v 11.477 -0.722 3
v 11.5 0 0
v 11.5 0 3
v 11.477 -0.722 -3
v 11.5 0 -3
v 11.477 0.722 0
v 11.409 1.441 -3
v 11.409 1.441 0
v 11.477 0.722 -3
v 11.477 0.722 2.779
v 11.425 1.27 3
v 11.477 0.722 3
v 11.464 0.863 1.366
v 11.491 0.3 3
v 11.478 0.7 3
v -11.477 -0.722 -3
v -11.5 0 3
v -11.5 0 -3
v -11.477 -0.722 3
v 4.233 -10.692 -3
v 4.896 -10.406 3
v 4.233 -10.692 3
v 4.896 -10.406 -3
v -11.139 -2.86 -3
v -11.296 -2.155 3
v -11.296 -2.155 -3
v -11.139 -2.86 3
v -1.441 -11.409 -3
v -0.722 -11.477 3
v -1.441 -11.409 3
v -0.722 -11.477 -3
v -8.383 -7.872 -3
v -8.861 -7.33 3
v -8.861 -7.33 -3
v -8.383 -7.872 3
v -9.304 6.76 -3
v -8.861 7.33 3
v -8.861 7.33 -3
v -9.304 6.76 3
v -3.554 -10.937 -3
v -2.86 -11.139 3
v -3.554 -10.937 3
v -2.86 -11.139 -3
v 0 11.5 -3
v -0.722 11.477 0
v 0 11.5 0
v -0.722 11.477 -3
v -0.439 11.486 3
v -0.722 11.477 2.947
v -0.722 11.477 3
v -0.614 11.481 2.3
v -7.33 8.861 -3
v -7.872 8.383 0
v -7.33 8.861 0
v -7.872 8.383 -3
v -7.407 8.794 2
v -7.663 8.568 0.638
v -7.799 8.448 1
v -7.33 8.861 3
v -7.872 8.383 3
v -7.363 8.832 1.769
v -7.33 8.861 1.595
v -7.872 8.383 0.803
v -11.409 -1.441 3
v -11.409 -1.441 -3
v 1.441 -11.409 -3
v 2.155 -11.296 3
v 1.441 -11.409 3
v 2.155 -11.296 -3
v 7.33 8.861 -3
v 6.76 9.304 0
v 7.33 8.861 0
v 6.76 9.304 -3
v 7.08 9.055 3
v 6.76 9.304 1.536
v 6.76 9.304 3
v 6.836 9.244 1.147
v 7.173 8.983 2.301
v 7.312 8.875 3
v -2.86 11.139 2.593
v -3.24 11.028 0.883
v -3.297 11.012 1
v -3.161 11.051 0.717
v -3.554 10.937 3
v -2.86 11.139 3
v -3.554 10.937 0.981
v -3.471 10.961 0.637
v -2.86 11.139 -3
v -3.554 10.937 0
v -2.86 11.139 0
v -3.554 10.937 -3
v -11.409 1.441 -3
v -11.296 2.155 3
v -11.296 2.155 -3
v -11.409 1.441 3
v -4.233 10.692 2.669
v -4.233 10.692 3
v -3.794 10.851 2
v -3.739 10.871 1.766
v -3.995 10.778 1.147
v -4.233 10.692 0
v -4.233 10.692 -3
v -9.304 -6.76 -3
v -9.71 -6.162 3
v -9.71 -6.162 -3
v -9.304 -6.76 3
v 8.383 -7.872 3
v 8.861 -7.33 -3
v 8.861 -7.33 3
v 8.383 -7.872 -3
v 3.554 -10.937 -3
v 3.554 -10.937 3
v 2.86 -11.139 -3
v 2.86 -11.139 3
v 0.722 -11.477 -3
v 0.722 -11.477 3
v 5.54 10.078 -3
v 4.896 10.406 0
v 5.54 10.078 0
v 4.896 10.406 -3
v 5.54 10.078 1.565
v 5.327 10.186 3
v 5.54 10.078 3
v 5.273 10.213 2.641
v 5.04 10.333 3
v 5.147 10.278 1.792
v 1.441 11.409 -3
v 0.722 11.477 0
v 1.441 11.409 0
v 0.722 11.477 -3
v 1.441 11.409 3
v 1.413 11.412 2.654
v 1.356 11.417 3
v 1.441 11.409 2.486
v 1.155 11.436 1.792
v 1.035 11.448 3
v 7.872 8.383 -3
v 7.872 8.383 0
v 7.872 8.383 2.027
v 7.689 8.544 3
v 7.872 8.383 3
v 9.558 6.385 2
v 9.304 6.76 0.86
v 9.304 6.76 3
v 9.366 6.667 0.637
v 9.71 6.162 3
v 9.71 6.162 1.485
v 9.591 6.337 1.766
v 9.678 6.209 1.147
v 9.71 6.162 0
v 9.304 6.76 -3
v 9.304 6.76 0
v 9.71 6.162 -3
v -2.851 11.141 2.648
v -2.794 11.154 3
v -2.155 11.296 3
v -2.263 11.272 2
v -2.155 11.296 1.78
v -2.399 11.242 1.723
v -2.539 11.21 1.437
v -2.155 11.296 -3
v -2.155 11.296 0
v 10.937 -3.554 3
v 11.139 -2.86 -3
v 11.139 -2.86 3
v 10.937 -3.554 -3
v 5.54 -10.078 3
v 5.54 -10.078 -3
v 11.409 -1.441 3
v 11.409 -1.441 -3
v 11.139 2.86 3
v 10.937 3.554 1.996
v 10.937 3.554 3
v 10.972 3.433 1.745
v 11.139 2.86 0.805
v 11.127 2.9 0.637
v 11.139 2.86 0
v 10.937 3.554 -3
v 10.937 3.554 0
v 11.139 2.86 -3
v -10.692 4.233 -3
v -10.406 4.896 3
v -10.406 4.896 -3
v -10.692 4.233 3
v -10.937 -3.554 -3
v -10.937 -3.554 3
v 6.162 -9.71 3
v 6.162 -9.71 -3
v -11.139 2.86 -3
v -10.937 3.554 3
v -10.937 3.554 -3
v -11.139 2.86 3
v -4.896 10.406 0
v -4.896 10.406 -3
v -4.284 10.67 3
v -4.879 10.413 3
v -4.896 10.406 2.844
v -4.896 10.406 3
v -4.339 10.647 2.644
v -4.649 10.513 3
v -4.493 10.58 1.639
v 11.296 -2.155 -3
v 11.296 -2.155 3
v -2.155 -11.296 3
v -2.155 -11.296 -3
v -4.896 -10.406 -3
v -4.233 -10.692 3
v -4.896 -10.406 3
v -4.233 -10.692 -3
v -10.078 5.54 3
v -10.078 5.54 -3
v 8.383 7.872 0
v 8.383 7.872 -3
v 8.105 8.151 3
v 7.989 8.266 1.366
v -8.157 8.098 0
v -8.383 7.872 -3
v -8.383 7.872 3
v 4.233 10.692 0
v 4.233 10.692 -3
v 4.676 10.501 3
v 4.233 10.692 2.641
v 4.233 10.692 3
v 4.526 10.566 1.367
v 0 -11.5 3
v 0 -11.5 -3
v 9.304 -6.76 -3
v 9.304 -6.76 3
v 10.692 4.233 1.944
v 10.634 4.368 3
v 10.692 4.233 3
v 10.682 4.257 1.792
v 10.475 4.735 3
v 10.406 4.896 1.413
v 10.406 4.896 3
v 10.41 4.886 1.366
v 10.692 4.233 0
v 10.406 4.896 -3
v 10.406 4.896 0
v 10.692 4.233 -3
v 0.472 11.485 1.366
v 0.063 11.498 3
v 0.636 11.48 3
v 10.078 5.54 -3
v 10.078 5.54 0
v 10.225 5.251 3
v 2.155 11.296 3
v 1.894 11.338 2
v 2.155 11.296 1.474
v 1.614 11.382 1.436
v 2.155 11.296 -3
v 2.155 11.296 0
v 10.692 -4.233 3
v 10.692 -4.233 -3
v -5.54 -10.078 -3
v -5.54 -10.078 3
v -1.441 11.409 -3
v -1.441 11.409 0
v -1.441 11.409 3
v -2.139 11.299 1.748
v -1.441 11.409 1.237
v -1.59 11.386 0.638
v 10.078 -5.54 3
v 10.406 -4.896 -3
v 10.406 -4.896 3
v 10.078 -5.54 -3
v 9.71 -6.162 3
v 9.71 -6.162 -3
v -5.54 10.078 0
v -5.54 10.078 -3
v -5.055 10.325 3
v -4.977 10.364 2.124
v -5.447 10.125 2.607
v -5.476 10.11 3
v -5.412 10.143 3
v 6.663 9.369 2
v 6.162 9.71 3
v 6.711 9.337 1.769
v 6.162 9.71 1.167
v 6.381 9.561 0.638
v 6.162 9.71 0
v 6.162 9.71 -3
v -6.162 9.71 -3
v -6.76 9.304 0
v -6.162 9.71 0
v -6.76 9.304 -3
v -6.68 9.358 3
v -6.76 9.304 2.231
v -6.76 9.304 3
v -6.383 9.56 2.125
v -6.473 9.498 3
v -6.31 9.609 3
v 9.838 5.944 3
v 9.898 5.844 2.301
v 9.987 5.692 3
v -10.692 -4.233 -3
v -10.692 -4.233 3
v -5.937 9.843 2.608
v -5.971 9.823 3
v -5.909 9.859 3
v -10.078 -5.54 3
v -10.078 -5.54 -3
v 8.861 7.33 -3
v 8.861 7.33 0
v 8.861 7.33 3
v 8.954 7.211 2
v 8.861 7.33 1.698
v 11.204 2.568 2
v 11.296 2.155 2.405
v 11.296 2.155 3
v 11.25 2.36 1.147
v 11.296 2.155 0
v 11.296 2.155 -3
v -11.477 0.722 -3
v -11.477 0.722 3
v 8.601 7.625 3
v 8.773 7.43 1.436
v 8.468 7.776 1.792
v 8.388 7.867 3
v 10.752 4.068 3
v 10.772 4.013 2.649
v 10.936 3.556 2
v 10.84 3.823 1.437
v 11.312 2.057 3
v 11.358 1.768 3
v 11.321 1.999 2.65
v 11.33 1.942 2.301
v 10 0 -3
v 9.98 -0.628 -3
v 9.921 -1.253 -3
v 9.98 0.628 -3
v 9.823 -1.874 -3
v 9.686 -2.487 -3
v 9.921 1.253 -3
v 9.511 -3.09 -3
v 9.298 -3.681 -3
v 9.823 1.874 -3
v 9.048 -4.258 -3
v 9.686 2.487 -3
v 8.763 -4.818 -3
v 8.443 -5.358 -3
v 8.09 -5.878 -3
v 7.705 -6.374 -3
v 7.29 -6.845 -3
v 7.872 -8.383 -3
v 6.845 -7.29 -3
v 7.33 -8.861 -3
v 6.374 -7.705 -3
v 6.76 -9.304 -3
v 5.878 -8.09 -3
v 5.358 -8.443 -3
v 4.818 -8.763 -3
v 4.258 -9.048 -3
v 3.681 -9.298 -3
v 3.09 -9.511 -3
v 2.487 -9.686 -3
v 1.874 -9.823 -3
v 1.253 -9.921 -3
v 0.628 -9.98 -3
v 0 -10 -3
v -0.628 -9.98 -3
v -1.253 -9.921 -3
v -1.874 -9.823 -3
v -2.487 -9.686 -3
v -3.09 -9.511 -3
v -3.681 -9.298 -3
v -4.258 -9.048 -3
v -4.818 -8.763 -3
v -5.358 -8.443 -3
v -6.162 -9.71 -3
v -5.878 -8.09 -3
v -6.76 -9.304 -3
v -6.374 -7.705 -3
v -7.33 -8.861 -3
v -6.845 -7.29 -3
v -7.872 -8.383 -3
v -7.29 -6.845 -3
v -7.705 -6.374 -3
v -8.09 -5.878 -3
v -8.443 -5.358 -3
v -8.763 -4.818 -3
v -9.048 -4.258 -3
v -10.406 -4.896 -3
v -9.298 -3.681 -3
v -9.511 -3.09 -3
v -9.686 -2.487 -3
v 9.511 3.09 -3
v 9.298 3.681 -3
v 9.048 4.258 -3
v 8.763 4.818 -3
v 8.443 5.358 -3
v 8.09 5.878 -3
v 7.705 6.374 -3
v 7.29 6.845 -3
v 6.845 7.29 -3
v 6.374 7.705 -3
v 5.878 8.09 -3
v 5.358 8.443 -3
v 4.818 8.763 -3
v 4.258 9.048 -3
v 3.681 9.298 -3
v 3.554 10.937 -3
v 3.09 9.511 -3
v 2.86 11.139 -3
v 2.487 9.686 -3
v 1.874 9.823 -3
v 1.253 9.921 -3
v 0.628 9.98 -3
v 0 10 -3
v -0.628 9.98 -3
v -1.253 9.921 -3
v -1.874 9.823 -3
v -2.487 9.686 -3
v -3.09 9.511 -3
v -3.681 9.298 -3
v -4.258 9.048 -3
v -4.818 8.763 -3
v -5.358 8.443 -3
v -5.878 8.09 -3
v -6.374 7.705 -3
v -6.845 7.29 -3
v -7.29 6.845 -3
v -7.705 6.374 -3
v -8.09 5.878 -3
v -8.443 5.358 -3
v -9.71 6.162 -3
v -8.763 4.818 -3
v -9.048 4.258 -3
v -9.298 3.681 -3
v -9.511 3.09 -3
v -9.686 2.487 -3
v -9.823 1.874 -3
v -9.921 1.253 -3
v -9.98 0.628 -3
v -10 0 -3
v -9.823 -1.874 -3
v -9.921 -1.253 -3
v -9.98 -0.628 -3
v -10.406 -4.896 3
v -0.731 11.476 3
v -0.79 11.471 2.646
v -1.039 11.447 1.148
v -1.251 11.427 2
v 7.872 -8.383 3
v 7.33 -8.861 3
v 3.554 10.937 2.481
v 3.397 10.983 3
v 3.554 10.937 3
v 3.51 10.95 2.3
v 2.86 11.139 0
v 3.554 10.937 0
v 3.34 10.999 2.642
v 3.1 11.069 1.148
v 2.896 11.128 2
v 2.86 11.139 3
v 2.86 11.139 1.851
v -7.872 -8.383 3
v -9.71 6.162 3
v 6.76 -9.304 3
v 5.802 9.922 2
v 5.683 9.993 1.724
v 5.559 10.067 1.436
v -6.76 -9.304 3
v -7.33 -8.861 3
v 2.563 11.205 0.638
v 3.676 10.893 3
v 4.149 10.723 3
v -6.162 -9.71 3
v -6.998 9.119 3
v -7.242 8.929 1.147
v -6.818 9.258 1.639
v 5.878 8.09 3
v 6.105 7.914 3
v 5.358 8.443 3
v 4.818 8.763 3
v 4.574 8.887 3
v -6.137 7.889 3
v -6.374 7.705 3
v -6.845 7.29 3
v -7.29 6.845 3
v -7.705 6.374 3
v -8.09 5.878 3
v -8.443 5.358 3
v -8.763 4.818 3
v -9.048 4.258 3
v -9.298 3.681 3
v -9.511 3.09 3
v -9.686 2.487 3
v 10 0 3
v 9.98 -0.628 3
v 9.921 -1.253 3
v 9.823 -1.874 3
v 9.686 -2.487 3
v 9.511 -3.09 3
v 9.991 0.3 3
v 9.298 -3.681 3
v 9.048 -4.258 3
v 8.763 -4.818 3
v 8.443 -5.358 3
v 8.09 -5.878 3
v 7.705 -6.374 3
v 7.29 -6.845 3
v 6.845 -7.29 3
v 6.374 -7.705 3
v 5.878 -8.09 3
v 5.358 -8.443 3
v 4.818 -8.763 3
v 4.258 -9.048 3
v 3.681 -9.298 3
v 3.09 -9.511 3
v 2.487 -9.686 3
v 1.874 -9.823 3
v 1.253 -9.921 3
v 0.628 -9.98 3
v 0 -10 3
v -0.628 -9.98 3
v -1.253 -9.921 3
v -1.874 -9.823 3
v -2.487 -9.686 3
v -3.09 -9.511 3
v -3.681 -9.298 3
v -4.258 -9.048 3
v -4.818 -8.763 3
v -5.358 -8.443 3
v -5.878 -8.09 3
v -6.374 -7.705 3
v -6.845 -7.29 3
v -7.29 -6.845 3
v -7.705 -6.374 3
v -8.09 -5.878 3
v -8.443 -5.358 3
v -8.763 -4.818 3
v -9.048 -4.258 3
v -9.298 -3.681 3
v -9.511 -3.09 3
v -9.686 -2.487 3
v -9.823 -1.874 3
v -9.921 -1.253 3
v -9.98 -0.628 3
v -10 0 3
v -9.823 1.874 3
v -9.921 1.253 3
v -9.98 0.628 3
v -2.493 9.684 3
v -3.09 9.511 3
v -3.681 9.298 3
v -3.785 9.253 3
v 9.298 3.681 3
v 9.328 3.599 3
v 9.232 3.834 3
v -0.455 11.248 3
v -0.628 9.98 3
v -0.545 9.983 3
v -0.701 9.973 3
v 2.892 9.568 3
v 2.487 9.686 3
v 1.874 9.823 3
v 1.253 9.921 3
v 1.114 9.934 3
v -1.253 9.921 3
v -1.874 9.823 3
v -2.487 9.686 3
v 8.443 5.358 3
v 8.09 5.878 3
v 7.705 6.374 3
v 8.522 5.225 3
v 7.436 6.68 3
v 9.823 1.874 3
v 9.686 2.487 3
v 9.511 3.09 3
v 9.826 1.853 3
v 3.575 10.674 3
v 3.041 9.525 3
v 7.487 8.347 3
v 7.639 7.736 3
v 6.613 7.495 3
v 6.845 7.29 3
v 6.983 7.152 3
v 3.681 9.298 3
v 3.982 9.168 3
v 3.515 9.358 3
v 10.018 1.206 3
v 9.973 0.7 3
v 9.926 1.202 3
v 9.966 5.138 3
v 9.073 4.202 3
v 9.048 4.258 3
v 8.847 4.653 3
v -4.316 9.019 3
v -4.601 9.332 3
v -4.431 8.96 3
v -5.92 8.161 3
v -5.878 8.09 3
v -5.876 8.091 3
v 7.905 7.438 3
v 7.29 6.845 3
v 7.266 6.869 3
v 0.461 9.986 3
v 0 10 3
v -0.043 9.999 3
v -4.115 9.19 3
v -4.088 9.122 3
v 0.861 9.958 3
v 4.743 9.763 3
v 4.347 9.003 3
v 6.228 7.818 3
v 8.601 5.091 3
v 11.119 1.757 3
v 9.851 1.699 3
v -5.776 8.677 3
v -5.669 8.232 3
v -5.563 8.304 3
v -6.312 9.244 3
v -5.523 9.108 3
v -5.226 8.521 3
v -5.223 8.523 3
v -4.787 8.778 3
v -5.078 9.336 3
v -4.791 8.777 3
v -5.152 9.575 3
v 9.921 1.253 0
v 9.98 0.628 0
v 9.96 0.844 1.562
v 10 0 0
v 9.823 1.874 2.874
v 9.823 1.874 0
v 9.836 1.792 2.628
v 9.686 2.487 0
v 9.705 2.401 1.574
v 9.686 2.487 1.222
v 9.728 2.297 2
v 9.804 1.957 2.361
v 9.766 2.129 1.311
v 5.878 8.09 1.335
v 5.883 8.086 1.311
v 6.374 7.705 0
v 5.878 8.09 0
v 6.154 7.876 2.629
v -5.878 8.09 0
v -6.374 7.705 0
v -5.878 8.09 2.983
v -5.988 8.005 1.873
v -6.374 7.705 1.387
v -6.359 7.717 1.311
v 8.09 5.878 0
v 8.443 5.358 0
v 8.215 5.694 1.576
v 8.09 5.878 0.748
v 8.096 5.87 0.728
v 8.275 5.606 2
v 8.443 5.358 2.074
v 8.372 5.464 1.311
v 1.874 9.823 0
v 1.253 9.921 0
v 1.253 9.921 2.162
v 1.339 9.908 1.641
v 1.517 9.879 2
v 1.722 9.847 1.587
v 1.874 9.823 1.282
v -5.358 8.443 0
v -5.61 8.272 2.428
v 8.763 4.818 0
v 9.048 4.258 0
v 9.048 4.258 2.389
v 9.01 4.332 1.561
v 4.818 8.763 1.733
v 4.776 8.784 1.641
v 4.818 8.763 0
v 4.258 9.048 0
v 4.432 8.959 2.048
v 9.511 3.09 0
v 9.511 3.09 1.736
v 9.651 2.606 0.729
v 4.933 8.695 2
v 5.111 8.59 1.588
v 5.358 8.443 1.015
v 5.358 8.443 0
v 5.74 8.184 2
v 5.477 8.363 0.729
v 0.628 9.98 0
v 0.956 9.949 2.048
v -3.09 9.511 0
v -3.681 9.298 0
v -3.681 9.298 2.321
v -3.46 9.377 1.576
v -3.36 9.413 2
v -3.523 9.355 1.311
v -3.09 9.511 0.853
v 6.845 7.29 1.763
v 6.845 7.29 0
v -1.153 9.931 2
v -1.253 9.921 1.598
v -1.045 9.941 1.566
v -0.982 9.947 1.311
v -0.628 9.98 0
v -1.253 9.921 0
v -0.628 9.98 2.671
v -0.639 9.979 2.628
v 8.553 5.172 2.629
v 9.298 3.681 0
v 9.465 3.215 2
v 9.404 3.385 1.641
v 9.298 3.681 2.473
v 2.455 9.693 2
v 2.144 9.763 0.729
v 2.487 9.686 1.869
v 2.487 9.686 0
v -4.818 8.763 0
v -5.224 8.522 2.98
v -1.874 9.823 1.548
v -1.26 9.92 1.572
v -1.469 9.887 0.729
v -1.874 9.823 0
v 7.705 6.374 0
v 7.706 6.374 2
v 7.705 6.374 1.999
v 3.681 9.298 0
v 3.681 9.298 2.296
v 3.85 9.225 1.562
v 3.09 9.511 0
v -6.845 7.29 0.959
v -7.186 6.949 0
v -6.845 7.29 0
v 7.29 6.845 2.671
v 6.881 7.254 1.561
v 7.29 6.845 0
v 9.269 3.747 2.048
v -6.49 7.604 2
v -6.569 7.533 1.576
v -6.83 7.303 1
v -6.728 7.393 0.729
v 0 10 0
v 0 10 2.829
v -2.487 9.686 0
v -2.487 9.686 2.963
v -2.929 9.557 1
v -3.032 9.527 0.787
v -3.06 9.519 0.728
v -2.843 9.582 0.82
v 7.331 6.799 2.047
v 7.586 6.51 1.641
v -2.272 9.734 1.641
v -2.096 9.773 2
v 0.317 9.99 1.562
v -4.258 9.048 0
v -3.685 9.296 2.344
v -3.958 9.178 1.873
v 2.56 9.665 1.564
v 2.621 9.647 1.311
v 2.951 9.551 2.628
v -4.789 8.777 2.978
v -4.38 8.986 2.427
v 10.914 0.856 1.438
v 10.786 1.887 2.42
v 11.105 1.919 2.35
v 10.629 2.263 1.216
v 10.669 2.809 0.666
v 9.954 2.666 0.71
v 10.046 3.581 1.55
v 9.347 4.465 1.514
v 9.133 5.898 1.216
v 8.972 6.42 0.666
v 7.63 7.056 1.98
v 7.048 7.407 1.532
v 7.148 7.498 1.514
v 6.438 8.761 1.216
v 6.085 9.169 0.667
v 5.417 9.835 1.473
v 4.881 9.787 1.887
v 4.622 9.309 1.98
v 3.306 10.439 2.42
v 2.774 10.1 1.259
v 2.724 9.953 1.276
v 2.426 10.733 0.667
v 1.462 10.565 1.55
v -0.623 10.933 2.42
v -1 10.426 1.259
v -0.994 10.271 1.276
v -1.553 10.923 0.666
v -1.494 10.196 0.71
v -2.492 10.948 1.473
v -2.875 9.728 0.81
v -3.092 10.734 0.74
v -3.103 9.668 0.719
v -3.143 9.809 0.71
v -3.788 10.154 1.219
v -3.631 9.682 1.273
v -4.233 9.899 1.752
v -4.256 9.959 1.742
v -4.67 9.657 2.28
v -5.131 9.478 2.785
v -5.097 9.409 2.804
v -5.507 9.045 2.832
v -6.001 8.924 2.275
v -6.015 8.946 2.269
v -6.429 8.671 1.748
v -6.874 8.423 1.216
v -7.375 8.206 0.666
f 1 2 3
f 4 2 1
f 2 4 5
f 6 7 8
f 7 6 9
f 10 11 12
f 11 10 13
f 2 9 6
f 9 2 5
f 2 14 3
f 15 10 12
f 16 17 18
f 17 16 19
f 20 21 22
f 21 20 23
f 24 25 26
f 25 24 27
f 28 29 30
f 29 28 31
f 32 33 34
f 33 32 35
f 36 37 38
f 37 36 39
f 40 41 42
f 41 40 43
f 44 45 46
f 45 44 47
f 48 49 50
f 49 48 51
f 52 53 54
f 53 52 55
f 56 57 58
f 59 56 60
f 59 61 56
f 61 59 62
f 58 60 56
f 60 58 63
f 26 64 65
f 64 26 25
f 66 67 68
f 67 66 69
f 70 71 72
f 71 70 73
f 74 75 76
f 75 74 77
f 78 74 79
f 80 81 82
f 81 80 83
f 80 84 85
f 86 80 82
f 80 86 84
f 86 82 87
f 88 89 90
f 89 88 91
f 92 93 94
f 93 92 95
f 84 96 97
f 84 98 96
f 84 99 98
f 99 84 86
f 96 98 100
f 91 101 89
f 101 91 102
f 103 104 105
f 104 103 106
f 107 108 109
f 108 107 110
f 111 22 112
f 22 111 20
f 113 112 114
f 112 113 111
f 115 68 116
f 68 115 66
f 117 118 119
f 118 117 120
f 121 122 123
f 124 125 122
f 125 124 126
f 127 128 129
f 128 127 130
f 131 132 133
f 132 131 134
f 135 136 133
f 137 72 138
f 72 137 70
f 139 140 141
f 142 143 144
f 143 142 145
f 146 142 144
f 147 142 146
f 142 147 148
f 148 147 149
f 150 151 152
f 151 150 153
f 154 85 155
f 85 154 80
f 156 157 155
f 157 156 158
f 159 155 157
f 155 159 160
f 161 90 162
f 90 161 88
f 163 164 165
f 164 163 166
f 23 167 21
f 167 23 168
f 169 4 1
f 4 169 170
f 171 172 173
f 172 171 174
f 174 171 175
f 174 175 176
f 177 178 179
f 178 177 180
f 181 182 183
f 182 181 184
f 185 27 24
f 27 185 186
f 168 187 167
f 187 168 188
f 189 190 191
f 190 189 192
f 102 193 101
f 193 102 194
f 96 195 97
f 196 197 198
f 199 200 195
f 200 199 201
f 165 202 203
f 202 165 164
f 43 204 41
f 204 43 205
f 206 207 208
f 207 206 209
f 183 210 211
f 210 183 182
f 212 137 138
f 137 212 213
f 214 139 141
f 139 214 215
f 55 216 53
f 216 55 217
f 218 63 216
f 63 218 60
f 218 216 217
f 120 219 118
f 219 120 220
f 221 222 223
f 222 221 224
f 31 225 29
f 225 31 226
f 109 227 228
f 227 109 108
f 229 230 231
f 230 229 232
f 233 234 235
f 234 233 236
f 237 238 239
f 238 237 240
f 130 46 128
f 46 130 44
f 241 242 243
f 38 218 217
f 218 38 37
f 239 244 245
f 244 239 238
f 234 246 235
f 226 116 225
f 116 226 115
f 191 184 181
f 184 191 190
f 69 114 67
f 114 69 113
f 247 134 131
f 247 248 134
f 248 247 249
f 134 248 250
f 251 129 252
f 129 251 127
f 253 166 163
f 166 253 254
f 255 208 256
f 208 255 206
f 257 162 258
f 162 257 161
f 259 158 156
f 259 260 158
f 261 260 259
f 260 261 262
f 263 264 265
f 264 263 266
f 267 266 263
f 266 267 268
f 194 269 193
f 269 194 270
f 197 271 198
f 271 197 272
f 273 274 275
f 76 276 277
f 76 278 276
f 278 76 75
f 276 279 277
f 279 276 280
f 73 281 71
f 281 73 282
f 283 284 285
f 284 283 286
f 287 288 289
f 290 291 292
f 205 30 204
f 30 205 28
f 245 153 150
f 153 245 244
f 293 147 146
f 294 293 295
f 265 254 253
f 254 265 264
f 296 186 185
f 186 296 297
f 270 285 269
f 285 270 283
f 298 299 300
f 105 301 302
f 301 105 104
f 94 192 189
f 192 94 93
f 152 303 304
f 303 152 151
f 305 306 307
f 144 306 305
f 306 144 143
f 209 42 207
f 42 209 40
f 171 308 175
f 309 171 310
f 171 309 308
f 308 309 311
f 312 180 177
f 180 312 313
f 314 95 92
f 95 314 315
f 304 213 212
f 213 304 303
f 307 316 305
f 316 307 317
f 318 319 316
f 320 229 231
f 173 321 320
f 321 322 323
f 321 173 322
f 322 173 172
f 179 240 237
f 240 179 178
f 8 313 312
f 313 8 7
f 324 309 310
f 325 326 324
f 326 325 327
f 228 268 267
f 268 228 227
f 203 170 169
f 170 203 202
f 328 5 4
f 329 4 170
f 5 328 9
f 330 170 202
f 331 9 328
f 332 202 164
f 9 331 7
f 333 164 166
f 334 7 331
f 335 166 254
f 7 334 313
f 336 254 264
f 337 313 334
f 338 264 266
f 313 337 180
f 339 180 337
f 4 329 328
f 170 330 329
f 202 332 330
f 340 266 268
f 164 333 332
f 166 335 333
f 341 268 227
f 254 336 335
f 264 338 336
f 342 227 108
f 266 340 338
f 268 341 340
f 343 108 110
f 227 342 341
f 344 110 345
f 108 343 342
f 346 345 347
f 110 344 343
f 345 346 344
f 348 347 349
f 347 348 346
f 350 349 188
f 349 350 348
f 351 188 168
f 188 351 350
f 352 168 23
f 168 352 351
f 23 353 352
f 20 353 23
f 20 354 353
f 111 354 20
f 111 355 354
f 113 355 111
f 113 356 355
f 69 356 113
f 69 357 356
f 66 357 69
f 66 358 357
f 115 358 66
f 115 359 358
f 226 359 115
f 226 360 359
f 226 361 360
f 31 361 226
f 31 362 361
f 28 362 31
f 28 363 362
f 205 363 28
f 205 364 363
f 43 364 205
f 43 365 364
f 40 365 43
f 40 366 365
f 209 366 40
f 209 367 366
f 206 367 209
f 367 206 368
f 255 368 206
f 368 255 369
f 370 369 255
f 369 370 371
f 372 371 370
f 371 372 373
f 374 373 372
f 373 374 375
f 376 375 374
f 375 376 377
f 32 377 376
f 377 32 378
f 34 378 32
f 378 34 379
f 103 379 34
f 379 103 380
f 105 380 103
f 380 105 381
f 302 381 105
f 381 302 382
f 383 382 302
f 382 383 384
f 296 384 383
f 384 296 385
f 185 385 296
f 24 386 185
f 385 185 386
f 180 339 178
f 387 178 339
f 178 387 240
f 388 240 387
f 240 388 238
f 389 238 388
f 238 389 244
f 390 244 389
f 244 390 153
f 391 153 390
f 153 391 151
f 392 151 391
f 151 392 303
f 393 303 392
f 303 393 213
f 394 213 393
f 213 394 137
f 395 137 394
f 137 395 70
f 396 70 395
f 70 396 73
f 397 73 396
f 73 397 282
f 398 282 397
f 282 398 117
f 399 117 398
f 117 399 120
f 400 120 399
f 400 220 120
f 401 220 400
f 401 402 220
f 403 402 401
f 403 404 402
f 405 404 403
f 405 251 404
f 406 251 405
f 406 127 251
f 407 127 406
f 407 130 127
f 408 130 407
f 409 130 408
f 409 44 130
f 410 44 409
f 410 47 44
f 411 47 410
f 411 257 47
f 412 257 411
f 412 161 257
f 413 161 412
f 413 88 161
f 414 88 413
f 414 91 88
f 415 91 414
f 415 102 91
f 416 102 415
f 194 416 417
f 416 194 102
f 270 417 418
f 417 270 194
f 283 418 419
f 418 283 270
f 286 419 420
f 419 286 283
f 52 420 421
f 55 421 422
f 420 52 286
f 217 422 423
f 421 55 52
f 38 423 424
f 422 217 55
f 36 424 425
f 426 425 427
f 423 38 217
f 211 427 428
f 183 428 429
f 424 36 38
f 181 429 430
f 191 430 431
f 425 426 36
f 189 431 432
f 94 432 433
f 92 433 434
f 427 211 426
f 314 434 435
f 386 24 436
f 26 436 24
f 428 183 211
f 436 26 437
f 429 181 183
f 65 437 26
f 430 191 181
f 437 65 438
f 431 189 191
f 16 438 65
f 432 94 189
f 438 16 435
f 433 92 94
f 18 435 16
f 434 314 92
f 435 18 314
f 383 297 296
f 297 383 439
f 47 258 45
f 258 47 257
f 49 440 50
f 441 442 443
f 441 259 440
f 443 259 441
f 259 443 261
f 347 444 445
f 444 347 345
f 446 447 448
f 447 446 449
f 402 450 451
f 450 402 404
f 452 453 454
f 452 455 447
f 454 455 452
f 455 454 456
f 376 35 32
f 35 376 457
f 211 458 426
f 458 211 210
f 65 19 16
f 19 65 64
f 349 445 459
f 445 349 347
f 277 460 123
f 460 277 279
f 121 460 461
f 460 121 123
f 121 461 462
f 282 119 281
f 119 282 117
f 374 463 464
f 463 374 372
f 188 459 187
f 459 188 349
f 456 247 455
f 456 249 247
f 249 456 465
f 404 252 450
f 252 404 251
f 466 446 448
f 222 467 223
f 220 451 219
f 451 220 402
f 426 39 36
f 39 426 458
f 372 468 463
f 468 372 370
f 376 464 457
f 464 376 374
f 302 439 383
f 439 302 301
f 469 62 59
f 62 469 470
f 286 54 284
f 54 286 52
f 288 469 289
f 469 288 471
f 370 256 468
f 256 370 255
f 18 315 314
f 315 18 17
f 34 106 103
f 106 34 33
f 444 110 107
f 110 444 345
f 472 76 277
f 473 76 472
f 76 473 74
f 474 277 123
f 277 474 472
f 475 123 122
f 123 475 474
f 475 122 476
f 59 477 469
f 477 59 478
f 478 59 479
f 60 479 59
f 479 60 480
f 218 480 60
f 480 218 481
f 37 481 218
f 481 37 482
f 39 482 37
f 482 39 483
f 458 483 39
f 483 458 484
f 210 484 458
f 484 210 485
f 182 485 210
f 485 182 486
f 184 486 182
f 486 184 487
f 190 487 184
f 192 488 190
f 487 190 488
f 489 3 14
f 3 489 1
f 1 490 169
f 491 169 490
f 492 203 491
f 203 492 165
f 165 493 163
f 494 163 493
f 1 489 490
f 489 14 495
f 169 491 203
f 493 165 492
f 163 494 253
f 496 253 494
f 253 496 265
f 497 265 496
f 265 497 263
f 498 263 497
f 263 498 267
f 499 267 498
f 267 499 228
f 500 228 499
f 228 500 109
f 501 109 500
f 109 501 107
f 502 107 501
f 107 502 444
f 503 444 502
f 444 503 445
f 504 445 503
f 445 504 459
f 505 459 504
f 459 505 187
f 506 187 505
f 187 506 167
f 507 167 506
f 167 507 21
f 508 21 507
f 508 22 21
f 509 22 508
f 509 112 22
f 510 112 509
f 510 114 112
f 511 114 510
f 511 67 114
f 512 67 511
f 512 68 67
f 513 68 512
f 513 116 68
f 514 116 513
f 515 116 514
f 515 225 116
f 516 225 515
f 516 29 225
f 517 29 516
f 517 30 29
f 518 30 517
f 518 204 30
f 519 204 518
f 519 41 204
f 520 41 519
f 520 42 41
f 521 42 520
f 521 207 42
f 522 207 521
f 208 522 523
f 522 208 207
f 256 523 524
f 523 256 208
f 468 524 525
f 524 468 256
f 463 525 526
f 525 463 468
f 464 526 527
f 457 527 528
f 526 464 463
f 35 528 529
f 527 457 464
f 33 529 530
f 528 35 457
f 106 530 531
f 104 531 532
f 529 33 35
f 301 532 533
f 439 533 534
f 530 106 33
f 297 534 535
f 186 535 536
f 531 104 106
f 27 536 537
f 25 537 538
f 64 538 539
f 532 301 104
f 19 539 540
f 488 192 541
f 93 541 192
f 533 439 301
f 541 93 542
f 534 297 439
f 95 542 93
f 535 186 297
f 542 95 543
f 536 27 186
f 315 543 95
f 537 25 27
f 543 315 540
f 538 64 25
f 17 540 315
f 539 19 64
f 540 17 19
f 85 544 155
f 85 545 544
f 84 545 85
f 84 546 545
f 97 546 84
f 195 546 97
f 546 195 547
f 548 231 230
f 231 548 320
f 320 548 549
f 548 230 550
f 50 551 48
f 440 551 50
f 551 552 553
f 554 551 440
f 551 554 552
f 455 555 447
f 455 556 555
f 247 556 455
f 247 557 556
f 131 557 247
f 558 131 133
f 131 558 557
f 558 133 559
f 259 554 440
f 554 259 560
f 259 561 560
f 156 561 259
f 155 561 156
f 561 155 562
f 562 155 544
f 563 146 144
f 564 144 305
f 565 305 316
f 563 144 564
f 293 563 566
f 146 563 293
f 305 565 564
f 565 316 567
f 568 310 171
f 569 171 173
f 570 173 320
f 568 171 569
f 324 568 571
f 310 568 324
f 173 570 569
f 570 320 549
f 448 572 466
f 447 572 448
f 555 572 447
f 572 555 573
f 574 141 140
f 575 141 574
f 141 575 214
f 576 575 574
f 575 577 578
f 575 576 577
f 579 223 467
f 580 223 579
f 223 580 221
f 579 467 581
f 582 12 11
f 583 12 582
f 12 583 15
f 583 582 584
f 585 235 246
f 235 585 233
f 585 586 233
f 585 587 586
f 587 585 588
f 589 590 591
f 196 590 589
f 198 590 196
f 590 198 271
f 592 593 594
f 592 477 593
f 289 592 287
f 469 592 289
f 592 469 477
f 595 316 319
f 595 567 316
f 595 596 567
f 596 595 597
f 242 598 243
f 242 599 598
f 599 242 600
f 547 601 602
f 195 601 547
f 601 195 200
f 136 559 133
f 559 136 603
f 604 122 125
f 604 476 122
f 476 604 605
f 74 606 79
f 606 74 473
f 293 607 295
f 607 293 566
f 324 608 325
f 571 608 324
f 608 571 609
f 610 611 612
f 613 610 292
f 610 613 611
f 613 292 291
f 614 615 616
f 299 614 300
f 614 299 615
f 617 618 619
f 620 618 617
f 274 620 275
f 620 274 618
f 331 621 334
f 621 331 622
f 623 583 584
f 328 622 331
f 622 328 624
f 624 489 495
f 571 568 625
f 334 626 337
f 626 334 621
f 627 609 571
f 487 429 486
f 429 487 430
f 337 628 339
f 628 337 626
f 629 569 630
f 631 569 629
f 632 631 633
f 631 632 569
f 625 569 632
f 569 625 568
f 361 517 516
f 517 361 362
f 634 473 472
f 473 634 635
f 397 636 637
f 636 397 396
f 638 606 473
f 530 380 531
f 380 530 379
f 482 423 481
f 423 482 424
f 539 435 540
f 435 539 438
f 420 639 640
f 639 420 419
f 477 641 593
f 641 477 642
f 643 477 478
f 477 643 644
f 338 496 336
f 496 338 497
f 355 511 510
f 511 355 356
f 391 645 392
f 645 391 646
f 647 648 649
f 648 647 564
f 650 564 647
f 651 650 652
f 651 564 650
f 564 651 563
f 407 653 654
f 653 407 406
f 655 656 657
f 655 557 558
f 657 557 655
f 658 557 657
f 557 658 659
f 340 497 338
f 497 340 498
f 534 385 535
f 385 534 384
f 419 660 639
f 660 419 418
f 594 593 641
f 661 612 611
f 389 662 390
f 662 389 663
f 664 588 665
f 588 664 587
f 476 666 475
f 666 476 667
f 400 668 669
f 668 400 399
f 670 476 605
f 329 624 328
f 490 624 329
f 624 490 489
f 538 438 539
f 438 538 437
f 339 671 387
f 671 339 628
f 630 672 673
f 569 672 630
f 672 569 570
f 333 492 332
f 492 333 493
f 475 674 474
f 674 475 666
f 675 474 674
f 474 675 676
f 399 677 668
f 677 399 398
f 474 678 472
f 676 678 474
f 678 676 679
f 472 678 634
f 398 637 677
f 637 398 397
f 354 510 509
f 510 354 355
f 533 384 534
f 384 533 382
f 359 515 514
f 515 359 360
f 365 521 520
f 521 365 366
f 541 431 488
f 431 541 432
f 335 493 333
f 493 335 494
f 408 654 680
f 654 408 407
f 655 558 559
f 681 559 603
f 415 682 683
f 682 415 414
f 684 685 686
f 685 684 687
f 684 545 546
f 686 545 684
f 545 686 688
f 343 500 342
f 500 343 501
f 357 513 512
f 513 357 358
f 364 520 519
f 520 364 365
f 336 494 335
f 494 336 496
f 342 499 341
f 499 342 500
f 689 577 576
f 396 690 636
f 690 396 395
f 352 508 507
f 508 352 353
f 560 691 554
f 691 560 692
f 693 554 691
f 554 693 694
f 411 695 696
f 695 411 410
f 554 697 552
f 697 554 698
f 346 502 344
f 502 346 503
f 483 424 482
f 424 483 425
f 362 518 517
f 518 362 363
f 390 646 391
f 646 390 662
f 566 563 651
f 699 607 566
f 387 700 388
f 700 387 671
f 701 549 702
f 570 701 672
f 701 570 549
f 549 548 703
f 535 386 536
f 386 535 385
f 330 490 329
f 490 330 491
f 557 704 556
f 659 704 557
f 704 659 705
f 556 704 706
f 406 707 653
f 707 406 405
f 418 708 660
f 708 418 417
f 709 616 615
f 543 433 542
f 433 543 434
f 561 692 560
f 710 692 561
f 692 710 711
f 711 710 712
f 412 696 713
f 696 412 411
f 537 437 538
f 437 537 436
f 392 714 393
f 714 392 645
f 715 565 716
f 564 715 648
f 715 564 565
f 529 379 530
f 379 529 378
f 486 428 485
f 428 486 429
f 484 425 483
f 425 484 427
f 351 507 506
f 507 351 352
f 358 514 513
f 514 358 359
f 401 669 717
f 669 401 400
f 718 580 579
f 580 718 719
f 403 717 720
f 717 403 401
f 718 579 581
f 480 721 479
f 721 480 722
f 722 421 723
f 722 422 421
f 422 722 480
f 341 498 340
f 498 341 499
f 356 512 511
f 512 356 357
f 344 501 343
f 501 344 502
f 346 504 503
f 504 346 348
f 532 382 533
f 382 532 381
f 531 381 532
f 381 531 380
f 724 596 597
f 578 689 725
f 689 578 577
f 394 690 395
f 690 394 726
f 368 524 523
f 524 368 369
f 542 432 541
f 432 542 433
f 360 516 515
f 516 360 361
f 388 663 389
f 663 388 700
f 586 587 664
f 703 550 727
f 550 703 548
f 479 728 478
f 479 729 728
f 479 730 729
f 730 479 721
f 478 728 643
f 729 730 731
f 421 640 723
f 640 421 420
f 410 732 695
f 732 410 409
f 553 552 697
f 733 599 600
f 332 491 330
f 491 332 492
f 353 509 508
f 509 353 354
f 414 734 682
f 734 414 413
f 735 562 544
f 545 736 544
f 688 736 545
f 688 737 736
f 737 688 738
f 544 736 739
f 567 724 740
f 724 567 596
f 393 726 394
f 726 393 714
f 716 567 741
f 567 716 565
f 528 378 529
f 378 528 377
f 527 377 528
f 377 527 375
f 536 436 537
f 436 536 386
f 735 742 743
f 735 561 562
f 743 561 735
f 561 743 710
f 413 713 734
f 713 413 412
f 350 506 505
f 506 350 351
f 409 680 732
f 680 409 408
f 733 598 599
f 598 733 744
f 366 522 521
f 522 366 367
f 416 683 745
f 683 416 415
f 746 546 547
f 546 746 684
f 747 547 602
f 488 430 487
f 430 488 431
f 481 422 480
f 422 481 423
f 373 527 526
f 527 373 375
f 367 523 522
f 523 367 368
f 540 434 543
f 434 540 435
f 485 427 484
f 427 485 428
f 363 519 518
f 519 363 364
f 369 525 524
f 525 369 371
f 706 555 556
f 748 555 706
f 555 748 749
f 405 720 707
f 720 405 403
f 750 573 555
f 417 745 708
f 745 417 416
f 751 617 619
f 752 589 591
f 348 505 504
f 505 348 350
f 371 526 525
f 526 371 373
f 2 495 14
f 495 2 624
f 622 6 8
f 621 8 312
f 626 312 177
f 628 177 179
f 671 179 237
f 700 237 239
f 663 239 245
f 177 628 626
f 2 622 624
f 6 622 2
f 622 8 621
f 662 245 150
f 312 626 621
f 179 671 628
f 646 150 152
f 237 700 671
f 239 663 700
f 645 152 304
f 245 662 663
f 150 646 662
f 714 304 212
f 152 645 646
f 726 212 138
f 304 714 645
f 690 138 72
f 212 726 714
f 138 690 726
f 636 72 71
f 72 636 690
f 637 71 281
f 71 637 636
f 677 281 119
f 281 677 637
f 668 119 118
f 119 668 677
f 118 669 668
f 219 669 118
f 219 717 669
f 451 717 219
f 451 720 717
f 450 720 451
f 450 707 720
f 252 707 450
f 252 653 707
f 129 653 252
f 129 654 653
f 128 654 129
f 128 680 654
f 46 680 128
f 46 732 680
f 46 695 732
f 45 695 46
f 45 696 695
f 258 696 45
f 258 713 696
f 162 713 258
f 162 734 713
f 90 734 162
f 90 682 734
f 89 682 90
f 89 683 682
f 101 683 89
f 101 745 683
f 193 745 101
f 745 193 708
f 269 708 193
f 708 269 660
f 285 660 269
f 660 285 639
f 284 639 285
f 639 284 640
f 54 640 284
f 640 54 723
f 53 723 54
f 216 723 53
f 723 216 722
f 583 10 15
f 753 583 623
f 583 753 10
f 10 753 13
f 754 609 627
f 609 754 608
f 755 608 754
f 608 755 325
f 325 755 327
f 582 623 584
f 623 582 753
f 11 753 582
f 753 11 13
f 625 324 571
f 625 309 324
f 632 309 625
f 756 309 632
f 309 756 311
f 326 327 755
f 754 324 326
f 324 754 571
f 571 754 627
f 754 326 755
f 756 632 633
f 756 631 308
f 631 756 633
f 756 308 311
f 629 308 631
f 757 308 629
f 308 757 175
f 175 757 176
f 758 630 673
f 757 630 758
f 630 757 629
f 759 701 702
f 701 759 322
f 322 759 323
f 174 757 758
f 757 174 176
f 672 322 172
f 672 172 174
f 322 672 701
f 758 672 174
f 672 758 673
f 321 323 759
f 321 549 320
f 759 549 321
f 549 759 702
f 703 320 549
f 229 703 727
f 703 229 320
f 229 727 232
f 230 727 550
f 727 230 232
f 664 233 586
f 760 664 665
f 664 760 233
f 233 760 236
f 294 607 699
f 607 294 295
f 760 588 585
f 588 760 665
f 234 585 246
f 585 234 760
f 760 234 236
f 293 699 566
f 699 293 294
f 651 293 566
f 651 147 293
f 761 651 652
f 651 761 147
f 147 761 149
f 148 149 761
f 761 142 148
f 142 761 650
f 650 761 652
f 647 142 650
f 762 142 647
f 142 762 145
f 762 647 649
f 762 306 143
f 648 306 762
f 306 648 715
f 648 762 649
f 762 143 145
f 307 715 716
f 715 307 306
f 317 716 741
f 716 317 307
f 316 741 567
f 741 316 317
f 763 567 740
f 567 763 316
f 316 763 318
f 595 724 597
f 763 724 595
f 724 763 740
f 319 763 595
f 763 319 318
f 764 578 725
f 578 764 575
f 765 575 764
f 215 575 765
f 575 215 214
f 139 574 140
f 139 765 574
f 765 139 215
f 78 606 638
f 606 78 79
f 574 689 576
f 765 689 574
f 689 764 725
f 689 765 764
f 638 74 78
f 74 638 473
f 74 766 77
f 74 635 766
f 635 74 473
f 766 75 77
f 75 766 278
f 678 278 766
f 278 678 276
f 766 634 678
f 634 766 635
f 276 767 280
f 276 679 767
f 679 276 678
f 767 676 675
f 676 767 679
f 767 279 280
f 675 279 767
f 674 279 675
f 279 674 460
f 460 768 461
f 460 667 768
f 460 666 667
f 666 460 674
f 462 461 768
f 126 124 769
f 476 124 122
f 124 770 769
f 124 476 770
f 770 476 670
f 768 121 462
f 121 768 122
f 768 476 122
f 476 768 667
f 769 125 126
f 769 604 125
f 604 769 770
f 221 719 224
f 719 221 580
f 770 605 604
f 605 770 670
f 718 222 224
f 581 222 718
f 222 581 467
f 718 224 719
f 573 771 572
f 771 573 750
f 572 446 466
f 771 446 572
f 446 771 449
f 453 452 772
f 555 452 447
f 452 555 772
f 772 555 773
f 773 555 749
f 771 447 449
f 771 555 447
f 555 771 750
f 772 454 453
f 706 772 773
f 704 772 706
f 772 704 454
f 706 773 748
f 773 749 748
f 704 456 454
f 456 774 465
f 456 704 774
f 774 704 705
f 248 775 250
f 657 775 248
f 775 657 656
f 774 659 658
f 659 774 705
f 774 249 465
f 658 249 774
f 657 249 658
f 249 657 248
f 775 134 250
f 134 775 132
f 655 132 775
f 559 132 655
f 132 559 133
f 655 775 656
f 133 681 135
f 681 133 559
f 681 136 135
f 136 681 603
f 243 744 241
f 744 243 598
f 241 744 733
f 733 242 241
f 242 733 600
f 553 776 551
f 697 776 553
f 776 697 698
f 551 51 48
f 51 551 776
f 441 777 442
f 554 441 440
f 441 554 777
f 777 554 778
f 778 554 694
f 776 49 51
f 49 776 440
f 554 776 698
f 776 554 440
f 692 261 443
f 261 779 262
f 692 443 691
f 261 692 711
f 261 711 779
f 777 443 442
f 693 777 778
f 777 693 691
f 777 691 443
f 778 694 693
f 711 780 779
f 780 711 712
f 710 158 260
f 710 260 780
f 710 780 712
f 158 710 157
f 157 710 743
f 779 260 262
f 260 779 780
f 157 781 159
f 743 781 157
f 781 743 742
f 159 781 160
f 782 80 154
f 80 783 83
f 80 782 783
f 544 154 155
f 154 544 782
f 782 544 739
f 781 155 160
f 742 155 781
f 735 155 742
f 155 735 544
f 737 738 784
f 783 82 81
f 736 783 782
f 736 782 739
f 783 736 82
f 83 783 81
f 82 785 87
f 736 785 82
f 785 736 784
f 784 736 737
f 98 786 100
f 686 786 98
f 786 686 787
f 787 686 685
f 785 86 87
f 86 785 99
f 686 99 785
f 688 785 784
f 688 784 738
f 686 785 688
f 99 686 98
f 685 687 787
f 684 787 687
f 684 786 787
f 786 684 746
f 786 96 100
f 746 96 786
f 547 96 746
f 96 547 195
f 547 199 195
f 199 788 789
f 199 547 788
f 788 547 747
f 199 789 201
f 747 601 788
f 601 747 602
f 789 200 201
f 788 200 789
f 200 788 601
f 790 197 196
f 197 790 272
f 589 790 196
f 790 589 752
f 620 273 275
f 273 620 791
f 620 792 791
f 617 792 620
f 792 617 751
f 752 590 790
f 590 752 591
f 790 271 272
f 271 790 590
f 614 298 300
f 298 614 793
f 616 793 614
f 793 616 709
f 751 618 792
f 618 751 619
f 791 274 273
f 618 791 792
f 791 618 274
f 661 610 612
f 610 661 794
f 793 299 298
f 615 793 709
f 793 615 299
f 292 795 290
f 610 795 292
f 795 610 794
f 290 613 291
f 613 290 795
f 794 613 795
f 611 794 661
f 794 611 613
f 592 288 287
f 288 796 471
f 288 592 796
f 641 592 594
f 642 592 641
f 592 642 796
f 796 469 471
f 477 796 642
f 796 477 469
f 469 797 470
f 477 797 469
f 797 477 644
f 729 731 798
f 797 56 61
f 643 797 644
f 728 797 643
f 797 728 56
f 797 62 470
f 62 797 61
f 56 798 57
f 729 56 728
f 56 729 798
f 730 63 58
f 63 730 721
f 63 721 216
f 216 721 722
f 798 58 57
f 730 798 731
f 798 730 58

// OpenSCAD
$fn=100;

radius = 10;
thickness = 1.5;
height = 6;
outerRadius = radius + thickness;
scaleFactor = 0;

//Mock Wave Coordinates
wavePeaks = [5,4,3,2,2,3,5,4,3,2,2,3,5,4,3,2,2,3,5,4,3,2,2,3,5,4,3,2,2,3,1,2,3,4,5,6,5,4,3,2,1];
waveDistances = [1,2,1,1,2,1,1,2,1,1,2,1,1,2,1,1,2,1,1,2,1,1,2,1,1,2,1,1,2,1,1,1,1,1,1,1,1,1,1,1,1];

circ = radius*2*pi();

length = sum(waveDistances,len(waveDistances)-1,0);

function pi()=3.14159265358979323846;
function sum(v,i,s=0) = (i==s ? v[i] : v[i] + sum(v,i-1,s));
function trans(i) = [cos(i)*radius*0.95,sin(i)*radius*0.95];
function angle(i) = 360/circ*i;

module wave() {
    for(i=[0:len(waveDistances)]) {
        distance = waveDistances[i];
        angle = angle((sum(waveDistances,i,0)-waveDistances[i])/2.2);
        translate(trans(angle))
            hull()
            rotate([0,0,angle])polyhedron(points=[[0,0,0],[0,distance,0],[0,distance/2,wavePeaks[i]],[thickness*1.5,0,0],[thickness*1.5,distance,0],[thickness*1.5,distance/2,wavePeaks[i]]],faces=[[3,4,5],[0,1,2]]);
    }
}
module ring() {
    difference() {
        cylinder(r=outerRadius,h=height,center=true);
        cylinder(r=radius,h=height,center=true);
    }
}
//!wave();

difference() {
    ring();
    wave();
}
